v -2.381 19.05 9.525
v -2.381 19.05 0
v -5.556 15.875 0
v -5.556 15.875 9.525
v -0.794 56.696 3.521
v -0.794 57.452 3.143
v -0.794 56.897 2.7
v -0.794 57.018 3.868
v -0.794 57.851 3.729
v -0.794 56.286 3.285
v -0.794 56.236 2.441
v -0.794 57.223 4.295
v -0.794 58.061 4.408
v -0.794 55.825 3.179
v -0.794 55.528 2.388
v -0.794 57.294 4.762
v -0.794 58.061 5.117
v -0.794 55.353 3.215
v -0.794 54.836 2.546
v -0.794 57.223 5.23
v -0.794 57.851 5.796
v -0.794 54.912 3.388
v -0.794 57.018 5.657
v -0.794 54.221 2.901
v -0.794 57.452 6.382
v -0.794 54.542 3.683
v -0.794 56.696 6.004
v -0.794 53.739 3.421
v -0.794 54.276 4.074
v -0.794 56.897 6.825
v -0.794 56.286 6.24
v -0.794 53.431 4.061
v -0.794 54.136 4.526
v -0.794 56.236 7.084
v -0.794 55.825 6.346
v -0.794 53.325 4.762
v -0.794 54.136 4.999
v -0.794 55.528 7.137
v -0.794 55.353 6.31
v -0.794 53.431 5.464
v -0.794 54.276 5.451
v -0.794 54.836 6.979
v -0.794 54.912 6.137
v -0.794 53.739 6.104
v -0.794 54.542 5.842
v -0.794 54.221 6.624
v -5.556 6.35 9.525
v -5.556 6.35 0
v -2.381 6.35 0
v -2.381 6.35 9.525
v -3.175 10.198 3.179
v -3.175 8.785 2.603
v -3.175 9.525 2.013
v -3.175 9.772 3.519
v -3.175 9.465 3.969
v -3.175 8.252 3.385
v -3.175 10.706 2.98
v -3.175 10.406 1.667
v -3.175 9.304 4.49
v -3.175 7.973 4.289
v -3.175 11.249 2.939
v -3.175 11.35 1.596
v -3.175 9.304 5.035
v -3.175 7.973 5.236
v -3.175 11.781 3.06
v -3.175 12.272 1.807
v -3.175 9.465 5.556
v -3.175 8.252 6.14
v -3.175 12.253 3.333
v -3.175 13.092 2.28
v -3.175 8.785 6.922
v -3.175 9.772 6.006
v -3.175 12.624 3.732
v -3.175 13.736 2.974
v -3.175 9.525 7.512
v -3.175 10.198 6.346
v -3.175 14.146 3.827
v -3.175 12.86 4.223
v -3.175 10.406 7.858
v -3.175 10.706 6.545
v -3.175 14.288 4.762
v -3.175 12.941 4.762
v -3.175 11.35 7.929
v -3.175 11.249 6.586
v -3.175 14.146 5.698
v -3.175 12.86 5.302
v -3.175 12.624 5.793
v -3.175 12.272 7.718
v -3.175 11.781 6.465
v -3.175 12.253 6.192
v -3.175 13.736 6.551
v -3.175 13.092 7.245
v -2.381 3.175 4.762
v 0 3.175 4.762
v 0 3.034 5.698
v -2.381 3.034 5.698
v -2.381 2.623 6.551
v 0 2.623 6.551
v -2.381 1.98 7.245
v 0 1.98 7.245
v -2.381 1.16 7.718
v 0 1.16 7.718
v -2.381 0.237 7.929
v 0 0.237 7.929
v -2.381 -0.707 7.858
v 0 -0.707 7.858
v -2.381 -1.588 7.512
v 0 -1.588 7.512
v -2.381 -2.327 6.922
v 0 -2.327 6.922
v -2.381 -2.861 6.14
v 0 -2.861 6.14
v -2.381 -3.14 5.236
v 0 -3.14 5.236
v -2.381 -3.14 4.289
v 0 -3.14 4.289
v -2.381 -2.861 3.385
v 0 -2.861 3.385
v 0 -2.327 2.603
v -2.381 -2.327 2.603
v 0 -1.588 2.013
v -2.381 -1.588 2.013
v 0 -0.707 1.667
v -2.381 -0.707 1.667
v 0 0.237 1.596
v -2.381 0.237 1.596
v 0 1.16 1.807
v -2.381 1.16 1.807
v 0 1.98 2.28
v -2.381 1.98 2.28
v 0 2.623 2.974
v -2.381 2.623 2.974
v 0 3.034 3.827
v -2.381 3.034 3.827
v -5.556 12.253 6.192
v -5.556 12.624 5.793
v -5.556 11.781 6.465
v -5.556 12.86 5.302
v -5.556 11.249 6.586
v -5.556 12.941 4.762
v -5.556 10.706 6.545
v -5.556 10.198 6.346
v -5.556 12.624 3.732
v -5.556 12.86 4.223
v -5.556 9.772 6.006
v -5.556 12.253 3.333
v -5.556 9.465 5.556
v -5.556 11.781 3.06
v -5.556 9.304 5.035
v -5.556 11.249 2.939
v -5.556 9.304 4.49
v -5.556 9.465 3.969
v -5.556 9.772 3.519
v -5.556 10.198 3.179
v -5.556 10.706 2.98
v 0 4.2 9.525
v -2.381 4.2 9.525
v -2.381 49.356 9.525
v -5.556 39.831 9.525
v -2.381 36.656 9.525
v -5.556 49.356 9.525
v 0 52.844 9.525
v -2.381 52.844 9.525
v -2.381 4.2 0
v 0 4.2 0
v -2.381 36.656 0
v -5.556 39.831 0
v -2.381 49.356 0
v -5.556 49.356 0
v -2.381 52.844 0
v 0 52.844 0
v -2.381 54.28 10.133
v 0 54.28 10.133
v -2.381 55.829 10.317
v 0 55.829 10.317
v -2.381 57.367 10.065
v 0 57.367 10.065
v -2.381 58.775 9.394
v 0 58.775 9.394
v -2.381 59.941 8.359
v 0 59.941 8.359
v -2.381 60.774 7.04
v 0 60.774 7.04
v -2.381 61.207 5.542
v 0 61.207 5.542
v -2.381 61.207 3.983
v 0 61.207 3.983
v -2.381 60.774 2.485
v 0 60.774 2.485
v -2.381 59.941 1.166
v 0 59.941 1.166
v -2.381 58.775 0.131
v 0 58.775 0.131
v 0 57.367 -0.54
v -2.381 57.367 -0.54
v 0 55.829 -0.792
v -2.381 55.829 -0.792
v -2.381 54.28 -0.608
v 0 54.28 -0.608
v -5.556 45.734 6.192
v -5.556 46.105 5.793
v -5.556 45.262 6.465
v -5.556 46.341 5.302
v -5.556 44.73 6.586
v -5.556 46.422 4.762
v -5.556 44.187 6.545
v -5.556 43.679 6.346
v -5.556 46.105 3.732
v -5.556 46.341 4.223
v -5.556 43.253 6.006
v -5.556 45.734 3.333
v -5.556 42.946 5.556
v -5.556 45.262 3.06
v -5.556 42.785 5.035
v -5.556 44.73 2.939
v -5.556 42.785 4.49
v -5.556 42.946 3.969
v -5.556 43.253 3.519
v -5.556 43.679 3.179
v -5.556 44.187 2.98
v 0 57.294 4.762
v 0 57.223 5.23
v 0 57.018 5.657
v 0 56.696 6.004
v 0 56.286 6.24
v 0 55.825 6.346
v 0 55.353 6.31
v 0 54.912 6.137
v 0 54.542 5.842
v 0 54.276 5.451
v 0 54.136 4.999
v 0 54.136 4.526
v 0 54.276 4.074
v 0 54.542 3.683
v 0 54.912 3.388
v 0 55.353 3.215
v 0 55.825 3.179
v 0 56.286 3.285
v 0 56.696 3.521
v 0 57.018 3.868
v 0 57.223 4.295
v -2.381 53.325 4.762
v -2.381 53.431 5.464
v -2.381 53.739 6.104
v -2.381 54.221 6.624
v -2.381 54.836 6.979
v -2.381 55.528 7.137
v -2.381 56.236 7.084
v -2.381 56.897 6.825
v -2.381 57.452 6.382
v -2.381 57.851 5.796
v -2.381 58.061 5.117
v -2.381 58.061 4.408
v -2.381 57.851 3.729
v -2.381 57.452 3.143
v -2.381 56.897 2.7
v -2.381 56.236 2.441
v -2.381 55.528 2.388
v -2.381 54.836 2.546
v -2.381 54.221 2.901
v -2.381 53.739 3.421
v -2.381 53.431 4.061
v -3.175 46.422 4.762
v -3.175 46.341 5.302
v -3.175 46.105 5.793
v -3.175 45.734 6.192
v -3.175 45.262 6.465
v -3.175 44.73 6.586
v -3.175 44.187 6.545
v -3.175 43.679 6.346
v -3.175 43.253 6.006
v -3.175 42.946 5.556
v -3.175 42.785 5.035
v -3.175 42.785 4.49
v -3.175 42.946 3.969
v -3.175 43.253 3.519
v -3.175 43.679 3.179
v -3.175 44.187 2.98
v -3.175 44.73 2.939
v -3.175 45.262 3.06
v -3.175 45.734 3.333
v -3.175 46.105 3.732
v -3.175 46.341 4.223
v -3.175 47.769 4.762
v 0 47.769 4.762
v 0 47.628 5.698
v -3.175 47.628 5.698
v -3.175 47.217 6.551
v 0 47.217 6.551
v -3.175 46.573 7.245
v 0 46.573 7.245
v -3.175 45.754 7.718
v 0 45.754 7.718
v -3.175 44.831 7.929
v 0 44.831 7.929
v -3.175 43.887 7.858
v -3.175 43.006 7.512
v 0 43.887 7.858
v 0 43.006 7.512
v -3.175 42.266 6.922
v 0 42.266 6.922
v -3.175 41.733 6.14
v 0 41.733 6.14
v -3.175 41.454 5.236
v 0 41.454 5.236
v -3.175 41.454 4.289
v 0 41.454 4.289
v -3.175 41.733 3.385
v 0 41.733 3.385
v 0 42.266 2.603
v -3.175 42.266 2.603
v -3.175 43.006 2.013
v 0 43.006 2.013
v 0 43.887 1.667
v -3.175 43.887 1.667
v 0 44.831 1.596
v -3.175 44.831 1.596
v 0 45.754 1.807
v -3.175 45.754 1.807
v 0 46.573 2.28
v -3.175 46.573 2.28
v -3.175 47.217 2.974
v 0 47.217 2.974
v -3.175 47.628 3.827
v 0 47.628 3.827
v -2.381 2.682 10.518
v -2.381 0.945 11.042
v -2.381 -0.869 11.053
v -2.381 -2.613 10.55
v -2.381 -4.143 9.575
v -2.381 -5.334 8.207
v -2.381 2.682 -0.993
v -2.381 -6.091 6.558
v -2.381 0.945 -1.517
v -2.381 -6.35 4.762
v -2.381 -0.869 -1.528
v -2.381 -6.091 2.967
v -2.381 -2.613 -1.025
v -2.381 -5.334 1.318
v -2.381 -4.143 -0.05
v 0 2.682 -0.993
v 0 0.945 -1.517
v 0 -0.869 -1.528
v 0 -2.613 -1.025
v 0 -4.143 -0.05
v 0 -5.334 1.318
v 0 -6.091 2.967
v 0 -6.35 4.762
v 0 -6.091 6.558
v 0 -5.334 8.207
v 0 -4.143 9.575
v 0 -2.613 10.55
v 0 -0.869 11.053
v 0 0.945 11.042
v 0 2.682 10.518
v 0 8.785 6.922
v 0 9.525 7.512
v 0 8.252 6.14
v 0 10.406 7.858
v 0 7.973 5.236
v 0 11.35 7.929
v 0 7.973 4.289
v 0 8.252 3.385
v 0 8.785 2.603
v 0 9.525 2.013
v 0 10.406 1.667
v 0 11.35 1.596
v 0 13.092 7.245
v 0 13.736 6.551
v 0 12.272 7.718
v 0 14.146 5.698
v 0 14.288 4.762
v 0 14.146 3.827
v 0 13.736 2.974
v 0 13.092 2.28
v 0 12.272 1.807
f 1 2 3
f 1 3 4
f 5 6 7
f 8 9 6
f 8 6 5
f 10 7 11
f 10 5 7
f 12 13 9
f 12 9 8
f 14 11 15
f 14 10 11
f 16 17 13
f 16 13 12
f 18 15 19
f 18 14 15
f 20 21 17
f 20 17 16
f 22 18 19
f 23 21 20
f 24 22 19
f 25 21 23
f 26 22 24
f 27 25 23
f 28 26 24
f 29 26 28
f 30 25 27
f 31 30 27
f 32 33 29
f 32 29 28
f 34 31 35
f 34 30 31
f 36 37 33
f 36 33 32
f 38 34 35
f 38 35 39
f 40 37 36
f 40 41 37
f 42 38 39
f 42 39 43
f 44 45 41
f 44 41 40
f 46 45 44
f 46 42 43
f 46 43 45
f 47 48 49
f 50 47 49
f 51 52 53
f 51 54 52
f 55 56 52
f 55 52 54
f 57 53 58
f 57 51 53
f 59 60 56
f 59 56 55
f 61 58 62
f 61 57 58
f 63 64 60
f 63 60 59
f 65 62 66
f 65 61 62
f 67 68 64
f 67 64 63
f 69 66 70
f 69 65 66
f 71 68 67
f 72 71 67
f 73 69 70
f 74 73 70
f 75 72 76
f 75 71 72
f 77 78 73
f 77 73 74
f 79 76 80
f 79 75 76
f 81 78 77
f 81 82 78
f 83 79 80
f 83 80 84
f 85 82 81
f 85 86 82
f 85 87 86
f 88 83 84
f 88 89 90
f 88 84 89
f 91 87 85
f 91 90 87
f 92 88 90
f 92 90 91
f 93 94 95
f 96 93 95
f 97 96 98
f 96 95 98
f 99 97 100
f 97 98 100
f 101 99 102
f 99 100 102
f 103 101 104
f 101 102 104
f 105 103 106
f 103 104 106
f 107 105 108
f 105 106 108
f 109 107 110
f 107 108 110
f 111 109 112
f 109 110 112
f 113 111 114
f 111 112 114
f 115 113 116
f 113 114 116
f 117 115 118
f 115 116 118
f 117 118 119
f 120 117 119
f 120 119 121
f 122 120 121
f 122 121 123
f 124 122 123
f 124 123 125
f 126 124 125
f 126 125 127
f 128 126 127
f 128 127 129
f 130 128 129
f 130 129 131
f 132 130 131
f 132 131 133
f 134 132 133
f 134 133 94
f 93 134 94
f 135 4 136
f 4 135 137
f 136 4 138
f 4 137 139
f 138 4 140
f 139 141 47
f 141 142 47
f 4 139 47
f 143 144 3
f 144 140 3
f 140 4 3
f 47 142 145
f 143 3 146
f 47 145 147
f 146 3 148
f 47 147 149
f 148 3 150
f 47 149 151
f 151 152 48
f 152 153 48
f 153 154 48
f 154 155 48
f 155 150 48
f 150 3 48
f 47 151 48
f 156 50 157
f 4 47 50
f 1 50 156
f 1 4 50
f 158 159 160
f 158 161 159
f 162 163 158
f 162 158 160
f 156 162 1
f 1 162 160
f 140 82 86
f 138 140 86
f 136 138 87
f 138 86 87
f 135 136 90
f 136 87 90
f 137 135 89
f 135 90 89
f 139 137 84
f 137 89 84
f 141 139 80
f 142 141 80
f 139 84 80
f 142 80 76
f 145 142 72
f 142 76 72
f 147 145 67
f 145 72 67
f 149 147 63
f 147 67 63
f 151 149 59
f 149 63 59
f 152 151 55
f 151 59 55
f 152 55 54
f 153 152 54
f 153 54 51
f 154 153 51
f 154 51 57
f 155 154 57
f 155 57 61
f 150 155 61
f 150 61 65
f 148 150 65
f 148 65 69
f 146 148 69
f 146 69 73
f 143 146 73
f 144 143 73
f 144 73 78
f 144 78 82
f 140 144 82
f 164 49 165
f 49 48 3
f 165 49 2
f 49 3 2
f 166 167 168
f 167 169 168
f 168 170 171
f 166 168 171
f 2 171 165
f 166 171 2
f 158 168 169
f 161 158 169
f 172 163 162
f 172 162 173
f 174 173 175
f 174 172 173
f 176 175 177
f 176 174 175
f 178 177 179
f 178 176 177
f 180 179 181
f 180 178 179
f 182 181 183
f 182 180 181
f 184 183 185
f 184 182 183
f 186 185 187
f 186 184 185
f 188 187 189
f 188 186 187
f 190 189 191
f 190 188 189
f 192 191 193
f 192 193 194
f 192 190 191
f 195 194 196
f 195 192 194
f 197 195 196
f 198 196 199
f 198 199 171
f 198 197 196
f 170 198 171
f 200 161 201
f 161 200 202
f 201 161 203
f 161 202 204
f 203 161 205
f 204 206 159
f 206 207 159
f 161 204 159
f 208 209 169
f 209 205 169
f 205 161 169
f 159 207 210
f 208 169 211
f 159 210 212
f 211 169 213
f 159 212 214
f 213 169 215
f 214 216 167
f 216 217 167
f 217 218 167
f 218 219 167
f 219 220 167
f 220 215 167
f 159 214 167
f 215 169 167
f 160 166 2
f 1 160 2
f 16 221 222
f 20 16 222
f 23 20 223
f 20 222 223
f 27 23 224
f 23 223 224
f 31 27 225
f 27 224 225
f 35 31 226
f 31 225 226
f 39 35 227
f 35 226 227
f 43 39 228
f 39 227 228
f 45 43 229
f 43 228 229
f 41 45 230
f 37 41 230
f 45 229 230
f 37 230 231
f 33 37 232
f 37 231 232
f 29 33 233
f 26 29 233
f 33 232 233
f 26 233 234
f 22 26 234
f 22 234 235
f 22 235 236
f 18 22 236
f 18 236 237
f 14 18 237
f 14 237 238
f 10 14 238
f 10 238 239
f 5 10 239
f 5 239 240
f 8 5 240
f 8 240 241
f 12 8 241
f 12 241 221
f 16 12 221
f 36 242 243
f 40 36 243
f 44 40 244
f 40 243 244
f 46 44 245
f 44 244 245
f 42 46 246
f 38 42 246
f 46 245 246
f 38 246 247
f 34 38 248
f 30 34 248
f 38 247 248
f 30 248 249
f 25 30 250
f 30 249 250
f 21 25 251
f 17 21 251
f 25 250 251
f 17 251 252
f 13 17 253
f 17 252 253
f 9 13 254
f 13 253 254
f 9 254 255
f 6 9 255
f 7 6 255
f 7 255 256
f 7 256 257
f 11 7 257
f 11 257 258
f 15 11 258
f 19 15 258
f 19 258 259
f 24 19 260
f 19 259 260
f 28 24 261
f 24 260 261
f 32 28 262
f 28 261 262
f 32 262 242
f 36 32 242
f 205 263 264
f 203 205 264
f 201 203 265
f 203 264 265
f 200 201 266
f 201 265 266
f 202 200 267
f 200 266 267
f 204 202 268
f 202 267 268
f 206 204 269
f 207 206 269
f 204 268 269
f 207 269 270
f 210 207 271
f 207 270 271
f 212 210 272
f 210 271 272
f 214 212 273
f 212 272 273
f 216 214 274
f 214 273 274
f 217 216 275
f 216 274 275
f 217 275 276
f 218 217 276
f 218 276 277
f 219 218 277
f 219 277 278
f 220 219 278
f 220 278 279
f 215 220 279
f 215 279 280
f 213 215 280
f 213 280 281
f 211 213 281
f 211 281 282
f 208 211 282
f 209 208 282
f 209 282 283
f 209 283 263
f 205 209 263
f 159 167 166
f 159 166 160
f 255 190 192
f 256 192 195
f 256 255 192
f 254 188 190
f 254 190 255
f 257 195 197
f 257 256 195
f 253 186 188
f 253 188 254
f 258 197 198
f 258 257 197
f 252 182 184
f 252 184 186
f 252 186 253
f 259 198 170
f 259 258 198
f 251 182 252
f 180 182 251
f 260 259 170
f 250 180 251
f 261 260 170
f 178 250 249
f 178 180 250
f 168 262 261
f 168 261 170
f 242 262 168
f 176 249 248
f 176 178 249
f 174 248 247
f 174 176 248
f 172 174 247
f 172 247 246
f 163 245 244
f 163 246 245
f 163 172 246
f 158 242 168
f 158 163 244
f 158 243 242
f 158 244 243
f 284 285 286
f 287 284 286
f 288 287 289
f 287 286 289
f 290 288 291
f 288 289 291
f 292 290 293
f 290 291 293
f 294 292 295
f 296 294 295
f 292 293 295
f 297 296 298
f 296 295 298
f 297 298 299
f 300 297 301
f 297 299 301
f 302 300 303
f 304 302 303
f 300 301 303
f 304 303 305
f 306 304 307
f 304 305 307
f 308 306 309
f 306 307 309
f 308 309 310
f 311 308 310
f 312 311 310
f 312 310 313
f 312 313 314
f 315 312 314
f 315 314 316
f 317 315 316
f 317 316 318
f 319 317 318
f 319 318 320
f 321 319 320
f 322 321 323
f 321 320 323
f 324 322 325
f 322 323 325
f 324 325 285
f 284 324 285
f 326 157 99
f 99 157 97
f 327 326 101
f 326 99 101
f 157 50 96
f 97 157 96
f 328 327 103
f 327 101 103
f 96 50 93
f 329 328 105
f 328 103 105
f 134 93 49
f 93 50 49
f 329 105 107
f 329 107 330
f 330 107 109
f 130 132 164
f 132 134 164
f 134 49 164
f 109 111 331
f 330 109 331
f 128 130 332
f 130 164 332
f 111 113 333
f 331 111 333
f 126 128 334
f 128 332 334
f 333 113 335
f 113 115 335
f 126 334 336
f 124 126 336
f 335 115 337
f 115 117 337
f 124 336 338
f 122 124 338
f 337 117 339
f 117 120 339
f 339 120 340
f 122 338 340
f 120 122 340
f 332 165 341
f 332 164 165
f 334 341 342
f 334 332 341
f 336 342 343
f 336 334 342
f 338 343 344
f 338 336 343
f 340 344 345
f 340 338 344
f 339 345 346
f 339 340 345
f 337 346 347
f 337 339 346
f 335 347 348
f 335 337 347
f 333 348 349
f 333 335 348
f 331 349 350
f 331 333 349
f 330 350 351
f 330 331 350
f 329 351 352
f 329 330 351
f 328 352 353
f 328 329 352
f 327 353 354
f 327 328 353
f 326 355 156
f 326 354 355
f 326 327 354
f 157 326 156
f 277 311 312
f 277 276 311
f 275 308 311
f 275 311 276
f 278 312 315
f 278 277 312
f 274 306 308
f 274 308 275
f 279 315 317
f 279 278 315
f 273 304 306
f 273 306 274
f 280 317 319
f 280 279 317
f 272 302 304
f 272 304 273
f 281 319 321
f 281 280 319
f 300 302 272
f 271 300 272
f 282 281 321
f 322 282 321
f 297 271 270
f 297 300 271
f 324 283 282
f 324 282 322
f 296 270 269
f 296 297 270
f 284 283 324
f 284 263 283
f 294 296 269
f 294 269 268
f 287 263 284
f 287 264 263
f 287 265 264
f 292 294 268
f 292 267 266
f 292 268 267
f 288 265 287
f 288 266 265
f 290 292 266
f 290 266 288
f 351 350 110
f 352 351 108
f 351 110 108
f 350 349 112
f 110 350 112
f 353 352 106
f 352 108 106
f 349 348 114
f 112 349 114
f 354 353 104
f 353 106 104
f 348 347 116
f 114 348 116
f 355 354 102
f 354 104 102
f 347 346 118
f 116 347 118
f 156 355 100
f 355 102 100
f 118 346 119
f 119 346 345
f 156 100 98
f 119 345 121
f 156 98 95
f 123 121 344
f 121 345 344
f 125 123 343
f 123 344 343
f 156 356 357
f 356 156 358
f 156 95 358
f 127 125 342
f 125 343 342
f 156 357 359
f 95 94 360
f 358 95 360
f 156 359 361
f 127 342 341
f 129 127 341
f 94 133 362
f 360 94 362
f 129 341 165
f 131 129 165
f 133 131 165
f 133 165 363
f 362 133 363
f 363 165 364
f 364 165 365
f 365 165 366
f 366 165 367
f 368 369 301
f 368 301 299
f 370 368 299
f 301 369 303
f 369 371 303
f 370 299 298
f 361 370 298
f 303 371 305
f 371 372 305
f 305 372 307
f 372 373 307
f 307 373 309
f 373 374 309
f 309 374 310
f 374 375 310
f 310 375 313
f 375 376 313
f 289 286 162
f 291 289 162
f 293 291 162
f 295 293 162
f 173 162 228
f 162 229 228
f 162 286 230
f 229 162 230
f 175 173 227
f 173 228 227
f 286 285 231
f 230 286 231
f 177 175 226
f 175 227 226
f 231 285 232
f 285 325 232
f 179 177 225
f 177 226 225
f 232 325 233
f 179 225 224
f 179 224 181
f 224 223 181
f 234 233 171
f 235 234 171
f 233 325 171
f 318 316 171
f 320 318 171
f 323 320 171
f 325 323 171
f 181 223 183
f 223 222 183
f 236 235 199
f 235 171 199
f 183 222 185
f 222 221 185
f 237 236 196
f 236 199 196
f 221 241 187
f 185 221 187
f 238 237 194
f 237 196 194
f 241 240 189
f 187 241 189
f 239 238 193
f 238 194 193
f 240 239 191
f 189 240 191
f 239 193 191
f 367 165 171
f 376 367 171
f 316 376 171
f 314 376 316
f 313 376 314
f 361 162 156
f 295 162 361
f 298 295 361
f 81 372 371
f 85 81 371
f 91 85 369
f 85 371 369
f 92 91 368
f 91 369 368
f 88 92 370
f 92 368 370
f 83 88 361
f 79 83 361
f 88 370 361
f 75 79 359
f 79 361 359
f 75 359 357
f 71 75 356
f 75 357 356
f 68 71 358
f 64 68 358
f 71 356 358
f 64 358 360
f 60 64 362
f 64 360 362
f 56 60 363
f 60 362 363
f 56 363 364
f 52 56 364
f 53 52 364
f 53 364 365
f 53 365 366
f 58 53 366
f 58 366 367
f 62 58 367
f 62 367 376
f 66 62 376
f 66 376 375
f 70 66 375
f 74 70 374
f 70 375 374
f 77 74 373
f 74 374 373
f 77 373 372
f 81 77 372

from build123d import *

# Parameters (mm, degrees)
F1_DEPTH  = 9.525
F2_R      = 5.55625
F2_R_2    = 6.35
F3_DEPTH  = 2.38125
F4_R      = 3.175
F4_R_2    = 1.8288
F4_R_3    = 1.5875
F5_DEPTH  = 5.55625
F6_R      = 2.38125
F7_DEPTH  = 1.5875
F8_SIZE   = 3.17499
F9_R      = 3.175
F10_DEPTH = 3.175


# Not quite as in the source:
# - a fillet or chamfer is up to 0.001 mm smaller than in the source, because OpenCascade refuses the exact size


with BuildPart() as f1:
    # F0 (on Top) → F1 (new body)
    with BuildSketch(Plane.XY):
        Polygon((0, 0), (0, 55.7060608), (-2.38125, 55.7060608), (-2.38125, 49.3560608), (-5.55625, 49.3560608), (-5.55625, 39.8310608), (-2.38125, 39.8310608), (-2.38125, 15.875), (-5.55625, 15.875), (-5.55625, 6.35), (-2.38125, 6.35), (-2.38125, 0), align=None)
    extrude(amount=F1_DEPTH)

    # F2 (on face) → F3 (join, through all)
    with BuildSketch(Plane(origin=(-2.38125, 0, 0), x_dir=(0, -1, 0), z_dir=(-1, 0, 0))):
        with Locations((-55.7060608, 4.7625)):
            Circle(F2_R)
        with Locations((0, 4.7625)):
            Circle(F2_R_2)
    extrude(amount=-F3_DEPTH)

    # F4 (on face) → F5 (cut, through all)
    with BuildSketch(Plane.YZ):
        with Locations((0, 4.7625)):
            Circle(F4_R)
        with Locations((11.1125, 4.7625)):
            Circle(F4_R_2)
        with Locations((44.5935608, 4.7625)):
            Circle(F4_R_2)
        with Locations((55.7060608001, 4.7625)):
            Circle(F4_R_3)
    extrude(amount=-F5_DEPTH, mode=Mode.SUBTRACT)

    # F6 (on face) → F7 (cut)
    with BuildSketch(Plane(origin=(-2.38125, 0, 0), x_dir=(0, -1, 0), z_dir=(-1, 0, 0))):
        with Locations((-55.7060608, 4.7625)):
            Circle(F6_R)
    extrude(amount=-F7_DEPTH, mode=Mode.SUBTRACT)

    # F8 (size 3.175 in the source; OpenCascade refuses exactly that, so slightly less here)
    f8_edges = [f1.edges().sort_by_distance(p)[0] for p in [
        (-2.38125, 39.831061, 4.7625),
        (-2.38125, 15.875, 4.7625),
    ]]
    chamfer(f8_edges, length=F8_SIZE)

    # F9 (on face) → F10 (cut)
    with BuildSketch(Plane.YZ):
        with Locations((11.1125, 4.7625)):
            Circle(F9_R)
        with Locations((44.5935608, 4.7625)):
            Circle(F9_R)
    extrude(amount=-F10_DEPTH, mode=Mode.SUBTRACT)


solid = f1.part
